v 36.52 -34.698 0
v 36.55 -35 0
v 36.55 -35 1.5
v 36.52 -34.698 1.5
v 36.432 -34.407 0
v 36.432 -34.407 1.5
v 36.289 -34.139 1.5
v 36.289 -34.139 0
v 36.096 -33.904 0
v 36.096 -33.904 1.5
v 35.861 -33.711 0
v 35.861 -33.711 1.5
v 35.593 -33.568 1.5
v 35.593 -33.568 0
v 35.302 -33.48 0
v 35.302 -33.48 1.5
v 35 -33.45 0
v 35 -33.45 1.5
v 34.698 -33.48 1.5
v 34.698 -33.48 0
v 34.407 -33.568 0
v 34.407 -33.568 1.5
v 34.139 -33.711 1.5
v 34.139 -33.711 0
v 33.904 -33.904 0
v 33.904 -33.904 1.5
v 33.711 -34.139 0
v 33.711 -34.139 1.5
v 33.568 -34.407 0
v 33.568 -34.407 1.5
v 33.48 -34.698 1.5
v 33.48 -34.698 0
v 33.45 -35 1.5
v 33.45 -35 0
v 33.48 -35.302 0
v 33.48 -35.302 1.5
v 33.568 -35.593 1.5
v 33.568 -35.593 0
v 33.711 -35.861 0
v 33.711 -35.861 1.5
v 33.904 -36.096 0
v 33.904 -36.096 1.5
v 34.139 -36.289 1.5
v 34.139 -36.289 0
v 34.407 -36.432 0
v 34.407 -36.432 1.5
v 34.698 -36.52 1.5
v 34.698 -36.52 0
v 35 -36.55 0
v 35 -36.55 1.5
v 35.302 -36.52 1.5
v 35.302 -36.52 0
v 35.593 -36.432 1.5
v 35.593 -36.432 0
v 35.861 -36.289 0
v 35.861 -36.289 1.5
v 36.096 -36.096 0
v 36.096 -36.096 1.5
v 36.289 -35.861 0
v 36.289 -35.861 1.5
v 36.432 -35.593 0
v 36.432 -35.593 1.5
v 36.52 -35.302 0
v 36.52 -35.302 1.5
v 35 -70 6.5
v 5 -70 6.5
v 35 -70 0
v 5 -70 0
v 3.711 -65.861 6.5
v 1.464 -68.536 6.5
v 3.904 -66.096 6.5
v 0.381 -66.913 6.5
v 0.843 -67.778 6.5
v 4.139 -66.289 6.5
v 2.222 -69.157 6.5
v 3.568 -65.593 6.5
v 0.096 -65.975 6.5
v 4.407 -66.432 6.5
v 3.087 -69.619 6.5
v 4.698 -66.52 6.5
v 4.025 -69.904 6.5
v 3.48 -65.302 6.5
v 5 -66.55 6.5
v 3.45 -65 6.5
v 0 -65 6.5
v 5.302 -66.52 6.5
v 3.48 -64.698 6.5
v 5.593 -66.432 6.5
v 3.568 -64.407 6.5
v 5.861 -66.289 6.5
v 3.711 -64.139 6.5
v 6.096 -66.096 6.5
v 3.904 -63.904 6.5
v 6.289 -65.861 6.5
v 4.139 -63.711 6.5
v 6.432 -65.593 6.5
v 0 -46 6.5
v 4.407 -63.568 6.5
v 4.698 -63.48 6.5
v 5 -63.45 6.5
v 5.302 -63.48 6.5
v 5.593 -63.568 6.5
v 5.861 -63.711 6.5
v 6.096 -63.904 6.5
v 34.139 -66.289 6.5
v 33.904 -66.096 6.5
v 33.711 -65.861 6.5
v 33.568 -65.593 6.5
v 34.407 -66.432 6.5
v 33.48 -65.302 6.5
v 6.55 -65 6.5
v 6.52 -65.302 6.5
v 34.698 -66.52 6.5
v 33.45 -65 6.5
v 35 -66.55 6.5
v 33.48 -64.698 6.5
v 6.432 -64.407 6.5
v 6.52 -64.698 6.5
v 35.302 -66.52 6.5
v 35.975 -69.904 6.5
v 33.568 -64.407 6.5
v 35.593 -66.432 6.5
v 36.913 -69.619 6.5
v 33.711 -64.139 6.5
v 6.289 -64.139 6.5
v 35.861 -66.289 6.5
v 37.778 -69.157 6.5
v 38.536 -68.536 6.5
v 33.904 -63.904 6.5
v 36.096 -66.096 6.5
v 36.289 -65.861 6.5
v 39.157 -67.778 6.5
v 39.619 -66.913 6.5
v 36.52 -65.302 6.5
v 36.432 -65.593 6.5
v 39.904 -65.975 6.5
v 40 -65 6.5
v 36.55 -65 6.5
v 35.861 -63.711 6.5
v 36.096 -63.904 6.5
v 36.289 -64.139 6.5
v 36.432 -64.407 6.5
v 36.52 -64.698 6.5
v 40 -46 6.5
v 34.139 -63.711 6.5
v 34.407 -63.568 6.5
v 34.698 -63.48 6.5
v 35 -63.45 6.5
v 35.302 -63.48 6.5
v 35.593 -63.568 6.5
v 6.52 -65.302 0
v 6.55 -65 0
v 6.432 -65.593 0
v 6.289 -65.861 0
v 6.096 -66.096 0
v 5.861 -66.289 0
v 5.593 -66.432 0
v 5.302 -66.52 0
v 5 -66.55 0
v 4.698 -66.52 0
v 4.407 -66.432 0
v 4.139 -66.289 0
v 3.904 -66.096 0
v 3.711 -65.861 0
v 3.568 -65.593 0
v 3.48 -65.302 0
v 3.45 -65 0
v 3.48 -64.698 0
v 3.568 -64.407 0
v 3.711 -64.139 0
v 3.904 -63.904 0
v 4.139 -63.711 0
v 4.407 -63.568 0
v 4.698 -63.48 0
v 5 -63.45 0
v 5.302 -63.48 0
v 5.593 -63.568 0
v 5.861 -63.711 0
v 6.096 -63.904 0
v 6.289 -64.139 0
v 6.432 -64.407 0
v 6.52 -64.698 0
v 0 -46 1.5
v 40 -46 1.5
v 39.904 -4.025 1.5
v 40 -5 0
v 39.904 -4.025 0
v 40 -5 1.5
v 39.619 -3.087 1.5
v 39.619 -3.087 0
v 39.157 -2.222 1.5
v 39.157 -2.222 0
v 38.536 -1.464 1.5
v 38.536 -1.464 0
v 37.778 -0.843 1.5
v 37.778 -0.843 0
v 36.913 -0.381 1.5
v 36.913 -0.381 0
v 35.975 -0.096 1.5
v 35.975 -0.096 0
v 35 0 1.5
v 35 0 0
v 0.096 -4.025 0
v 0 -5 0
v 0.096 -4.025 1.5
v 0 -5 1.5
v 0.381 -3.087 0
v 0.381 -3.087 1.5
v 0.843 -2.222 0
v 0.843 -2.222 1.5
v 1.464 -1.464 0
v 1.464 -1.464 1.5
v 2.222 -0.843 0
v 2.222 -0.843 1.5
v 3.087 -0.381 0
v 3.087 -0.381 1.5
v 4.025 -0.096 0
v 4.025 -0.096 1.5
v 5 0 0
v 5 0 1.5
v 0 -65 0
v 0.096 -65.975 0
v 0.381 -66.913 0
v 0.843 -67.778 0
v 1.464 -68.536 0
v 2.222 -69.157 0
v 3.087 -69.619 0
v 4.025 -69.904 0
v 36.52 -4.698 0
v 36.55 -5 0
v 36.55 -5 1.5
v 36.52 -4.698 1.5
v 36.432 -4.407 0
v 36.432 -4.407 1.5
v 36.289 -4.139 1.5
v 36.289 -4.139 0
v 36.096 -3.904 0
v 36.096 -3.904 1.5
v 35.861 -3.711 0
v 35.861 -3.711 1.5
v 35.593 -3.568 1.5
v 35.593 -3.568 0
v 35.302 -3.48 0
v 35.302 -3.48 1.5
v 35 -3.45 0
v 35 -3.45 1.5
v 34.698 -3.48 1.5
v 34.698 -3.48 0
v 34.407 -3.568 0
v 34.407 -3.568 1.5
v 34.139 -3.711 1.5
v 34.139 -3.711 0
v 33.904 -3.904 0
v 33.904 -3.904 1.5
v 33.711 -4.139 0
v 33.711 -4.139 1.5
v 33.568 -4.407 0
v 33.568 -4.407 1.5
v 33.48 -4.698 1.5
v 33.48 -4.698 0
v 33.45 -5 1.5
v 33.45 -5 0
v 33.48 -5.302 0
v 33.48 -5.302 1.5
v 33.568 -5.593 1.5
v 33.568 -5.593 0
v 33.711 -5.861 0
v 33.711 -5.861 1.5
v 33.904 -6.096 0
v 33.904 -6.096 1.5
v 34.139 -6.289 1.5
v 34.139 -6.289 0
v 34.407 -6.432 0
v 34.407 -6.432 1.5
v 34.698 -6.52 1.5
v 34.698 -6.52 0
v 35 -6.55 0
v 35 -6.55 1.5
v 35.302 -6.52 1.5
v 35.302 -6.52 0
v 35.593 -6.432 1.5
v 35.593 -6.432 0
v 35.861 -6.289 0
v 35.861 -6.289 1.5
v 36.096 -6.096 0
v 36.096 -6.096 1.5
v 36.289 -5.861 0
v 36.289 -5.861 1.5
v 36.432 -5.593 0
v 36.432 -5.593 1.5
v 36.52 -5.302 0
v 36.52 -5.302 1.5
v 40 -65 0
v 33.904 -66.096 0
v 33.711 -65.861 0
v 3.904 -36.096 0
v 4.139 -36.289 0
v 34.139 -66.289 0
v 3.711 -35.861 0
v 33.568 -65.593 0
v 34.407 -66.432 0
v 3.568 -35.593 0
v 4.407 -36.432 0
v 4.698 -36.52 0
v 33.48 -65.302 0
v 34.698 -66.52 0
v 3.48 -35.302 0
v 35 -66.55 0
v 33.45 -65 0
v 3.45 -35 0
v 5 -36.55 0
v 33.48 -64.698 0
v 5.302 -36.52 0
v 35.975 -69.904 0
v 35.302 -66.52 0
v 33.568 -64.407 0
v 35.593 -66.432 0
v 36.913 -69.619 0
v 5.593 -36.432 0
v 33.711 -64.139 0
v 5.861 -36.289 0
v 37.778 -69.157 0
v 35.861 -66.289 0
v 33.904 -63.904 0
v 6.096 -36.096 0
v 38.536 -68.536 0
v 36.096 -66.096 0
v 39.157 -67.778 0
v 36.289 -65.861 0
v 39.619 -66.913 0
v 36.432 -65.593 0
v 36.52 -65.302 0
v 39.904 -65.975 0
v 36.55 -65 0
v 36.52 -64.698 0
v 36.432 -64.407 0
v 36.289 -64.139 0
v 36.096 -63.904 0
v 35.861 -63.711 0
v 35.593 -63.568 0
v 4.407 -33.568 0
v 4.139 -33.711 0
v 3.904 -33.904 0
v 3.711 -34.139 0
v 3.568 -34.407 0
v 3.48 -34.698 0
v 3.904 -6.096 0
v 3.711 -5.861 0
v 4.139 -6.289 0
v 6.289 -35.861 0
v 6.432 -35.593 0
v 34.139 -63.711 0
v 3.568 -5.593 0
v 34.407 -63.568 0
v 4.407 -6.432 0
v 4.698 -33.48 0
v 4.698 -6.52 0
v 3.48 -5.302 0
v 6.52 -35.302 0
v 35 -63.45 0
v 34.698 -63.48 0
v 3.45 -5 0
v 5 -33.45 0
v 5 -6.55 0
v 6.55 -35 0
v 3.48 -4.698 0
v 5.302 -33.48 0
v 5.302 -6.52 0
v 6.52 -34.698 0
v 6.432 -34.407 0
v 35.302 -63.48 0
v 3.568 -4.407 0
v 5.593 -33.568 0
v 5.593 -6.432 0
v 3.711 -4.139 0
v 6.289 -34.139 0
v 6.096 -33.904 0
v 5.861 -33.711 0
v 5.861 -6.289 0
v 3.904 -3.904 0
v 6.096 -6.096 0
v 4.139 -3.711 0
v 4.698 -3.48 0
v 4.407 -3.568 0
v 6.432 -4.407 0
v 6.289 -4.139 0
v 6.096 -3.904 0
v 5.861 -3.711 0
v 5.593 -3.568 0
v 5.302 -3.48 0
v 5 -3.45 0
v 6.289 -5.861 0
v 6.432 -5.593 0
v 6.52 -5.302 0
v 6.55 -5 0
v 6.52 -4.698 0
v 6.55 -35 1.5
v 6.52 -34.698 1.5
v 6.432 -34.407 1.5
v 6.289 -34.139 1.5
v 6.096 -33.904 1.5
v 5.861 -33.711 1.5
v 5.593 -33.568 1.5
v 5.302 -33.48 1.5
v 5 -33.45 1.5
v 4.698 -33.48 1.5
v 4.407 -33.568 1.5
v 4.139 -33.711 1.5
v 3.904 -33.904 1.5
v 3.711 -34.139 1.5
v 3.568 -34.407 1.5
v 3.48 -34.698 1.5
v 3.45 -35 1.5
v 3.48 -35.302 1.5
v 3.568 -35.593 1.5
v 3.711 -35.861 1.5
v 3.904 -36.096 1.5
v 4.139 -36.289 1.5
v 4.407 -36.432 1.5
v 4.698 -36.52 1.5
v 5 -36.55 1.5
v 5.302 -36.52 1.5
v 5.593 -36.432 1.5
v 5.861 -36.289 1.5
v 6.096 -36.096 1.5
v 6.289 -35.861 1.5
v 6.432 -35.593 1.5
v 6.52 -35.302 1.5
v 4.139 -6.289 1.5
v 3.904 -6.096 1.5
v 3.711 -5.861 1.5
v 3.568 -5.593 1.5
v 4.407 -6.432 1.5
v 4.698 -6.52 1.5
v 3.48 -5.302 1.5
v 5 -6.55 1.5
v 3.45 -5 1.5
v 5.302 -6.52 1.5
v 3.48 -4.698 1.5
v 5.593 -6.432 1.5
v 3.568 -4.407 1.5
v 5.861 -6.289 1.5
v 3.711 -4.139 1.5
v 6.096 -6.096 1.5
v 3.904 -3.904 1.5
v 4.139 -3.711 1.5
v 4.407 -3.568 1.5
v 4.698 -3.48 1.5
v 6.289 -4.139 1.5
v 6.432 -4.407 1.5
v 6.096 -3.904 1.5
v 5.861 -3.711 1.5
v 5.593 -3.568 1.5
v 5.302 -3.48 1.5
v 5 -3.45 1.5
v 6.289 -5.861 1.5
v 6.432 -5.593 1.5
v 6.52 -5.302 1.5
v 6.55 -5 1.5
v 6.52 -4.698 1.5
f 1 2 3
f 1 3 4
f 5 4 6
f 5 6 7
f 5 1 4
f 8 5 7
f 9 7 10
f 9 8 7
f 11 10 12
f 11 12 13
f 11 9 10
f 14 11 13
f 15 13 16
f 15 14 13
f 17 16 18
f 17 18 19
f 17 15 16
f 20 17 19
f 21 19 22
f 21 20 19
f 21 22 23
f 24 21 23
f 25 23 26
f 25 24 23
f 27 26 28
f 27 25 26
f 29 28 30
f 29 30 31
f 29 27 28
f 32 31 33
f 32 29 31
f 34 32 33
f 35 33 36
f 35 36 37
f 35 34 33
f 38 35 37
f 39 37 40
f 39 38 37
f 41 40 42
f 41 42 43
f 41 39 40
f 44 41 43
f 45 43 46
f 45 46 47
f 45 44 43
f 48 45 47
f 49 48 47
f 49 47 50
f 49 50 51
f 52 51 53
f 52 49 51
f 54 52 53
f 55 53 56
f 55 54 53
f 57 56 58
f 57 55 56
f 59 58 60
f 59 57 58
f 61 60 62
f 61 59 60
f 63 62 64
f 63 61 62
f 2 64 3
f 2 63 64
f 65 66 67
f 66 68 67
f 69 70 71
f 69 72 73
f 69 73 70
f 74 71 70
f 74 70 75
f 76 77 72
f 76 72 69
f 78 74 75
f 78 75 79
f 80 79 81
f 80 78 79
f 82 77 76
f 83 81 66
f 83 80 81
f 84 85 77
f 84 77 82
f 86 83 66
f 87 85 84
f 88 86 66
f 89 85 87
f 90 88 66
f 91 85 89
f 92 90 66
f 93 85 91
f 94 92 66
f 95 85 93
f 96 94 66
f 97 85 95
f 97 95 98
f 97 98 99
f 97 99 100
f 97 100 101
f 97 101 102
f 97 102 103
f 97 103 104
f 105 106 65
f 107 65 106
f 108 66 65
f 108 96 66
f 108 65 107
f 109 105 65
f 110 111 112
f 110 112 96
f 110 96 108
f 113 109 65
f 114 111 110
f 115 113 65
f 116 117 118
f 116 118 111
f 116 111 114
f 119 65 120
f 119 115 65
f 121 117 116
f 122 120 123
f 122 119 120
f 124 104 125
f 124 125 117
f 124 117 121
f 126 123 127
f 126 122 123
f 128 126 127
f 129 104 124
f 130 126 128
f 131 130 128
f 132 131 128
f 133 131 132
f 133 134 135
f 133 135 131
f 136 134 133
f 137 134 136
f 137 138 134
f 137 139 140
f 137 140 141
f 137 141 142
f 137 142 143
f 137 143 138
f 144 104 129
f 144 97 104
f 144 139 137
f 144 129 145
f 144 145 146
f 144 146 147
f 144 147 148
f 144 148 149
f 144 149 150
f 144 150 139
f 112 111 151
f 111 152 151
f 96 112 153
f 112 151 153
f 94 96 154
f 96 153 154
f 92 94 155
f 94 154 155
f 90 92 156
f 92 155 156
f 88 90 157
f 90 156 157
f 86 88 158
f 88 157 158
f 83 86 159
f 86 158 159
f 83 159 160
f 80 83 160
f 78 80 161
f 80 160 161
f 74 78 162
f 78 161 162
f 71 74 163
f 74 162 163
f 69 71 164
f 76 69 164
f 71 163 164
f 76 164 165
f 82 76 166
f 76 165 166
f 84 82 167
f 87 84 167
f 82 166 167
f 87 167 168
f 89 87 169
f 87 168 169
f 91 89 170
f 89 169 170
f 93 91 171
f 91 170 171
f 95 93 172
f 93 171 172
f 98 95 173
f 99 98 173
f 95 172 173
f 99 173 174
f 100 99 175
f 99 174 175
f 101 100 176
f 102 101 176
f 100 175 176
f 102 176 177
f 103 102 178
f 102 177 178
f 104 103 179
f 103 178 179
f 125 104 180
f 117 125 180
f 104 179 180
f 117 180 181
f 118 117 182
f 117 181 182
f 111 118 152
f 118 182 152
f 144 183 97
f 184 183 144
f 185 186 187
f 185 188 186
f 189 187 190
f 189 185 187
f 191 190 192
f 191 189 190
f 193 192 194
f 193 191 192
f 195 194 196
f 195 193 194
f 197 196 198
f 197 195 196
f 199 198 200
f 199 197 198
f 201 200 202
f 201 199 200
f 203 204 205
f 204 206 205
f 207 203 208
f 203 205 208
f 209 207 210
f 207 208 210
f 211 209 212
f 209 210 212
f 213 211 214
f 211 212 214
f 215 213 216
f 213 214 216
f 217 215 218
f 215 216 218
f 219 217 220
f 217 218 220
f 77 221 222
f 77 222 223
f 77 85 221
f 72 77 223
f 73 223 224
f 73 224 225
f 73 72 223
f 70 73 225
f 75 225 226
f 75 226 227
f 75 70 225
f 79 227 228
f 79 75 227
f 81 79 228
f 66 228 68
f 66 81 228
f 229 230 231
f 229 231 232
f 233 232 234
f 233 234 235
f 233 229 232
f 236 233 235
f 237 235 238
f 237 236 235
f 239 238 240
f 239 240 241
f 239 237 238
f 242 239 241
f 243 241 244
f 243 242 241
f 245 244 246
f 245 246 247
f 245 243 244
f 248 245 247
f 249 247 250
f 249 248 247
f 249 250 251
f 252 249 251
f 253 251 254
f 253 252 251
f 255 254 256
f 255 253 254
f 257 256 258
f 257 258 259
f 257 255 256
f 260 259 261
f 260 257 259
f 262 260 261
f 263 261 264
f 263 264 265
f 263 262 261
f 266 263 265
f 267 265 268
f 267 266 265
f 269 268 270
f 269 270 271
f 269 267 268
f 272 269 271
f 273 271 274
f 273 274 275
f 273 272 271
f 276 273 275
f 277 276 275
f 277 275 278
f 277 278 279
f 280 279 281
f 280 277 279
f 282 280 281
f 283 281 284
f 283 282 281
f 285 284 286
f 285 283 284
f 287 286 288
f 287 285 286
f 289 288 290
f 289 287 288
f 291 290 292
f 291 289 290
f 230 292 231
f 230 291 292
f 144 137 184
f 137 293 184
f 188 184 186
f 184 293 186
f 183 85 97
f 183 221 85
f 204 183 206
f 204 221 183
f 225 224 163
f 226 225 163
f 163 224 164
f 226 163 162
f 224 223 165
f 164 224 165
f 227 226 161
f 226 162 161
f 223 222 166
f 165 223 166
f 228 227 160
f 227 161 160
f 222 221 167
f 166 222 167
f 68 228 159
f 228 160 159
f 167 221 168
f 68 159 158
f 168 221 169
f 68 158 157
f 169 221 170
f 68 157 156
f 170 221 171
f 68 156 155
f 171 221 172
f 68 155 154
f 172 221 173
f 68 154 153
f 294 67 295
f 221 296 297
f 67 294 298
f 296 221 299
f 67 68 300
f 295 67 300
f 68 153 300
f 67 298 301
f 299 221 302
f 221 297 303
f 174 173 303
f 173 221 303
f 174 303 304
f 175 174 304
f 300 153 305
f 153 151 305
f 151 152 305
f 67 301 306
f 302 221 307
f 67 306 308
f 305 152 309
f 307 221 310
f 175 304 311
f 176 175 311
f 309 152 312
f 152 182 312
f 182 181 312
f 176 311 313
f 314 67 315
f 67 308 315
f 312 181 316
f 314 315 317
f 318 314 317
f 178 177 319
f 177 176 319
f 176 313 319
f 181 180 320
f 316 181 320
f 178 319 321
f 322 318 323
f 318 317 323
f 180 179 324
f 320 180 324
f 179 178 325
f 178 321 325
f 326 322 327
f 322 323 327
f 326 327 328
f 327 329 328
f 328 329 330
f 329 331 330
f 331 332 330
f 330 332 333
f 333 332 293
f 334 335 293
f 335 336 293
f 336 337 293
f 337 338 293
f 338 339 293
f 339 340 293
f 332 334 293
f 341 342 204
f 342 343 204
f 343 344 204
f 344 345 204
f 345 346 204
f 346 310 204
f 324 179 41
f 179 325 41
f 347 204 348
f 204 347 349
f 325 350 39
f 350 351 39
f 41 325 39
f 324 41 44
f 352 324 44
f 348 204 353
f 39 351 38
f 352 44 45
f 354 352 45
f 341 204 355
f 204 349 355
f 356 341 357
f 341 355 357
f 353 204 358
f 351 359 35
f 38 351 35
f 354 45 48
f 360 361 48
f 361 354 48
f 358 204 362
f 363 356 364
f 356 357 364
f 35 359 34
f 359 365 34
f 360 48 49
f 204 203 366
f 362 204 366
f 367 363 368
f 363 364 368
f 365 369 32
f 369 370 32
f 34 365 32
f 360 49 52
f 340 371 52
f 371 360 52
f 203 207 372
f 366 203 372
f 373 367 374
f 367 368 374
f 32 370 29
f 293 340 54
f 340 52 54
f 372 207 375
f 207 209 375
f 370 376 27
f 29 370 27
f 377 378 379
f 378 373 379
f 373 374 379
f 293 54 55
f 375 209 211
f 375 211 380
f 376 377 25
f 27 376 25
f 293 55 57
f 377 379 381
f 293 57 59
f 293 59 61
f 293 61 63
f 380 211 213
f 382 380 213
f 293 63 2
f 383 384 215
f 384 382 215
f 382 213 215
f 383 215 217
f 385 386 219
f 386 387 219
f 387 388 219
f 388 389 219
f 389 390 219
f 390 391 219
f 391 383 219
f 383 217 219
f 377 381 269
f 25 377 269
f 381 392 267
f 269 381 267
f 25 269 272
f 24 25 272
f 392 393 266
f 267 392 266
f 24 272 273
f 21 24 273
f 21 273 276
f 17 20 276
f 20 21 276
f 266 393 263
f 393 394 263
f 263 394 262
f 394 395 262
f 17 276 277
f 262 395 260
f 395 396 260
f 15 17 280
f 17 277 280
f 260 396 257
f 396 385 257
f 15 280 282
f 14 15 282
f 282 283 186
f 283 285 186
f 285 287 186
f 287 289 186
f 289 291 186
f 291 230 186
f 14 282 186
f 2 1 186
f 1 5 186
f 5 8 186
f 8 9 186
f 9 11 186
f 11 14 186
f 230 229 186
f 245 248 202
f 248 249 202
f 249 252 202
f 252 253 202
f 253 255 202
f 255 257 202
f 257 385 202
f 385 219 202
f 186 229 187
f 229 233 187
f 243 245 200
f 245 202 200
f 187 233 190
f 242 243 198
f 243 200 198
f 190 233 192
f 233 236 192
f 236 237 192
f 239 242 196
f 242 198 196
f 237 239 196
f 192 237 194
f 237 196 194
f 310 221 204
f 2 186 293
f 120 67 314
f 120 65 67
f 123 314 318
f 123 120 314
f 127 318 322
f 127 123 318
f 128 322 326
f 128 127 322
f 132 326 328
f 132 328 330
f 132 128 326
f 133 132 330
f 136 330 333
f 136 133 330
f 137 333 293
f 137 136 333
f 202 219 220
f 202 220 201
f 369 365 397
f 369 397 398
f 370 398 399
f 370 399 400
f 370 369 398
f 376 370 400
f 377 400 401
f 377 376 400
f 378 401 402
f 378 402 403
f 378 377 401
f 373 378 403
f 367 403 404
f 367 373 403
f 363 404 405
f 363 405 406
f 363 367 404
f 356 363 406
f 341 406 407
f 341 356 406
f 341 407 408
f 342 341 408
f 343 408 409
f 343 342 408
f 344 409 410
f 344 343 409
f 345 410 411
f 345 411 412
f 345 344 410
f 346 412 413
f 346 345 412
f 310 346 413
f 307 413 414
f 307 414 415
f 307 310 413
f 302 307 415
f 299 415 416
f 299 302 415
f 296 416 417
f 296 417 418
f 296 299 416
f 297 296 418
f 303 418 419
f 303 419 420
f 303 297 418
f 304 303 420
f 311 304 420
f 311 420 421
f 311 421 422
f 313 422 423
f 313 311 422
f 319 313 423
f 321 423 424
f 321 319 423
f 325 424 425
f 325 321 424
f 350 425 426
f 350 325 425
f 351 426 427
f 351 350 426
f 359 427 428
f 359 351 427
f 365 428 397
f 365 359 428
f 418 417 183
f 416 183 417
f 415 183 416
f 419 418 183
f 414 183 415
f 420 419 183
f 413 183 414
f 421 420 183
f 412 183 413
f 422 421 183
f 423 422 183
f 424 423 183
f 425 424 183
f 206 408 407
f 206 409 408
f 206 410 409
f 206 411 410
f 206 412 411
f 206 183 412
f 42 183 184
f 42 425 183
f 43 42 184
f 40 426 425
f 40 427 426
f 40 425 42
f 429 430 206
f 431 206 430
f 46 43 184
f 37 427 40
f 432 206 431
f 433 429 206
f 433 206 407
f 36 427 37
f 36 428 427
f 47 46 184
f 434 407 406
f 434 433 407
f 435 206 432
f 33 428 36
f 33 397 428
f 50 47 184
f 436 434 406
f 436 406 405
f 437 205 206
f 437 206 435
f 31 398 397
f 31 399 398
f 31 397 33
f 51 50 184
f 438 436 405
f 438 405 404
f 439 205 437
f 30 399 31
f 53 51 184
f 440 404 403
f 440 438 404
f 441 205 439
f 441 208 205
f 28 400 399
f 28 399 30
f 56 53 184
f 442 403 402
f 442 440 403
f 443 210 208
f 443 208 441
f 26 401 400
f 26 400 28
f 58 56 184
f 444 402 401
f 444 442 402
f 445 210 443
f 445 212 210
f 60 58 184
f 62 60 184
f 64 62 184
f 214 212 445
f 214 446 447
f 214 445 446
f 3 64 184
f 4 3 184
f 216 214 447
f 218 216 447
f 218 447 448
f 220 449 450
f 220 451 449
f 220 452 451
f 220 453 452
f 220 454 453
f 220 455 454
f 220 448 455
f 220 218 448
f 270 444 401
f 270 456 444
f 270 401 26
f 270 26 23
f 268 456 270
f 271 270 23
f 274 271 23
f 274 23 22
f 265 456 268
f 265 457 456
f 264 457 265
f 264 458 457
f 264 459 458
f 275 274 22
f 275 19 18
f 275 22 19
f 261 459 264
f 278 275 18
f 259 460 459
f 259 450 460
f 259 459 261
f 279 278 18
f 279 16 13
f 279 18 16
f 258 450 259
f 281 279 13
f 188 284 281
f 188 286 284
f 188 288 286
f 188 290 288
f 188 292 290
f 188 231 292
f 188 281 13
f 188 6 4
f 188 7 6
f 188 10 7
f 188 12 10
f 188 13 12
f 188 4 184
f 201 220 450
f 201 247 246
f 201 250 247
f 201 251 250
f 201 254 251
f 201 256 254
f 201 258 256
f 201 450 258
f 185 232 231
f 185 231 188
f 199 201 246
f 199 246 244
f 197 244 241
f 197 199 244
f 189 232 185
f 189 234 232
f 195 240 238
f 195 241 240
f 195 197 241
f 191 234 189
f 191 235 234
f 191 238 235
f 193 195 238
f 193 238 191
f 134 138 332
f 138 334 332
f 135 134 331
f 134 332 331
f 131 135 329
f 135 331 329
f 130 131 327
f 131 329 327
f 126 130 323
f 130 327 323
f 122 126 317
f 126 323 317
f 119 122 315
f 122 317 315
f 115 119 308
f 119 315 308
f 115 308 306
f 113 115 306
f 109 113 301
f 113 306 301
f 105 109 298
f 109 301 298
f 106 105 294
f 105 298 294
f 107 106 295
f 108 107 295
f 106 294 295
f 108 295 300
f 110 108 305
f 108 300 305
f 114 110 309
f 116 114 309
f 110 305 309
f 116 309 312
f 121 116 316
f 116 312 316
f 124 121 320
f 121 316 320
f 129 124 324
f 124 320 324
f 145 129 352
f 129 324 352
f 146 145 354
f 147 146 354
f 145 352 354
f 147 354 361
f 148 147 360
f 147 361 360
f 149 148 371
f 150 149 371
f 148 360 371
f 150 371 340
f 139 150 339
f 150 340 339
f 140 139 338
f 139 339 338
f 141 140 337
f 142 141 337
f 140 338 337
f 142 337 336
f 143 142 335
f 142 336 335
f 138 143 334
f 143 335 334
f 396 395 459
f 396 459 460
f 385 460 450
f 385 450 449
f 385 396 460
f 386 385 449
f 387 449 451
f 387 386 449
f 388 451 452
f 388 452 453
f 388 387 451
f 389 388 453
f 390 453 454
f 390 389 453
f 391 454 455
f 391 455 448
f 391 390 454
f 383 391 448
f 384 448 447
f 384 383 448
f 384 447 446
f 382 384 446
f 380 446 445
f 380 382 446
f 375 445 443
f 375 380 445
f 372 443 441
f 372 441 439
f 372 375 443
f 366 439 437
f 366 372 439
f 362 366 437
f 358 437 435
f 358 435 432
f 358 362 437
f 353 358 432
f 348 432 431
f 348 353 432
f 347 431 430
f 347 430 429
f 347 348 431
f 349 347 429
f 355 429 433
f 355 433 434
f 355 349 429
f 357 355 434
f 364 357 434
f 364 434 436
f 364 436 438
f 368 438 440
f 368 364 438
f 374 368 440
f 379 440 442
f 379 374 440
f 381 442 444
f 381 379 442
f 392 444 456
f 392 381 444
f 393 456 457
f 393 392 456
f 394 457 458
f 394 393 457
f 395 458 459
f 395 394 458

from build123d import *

# Parameters (mm, degrees)
SKETCH_1_W          = 40
SKETCH_1_H          = 70
SKETCH_1_R          = 1.55
EXTRUDE_1_DEPTH     = 1.5
SKETCH_2_W          = 40
SKETCH_2_H          = 24
EXTRUDE_2_DEPTH     = 5
SKETCH_3_R          = 1.55
CUT_EXTRUDE_1_DEPTH = 25
FILLET_1_R          = 5


with BuildPart() as part:
    # 草图1 → 凸台-拉伸1 (new body)
    with BuildSketch(Plane.XY):
        with Locations((20, -35)):
            Rectangle(SKETCH_1_W, SKETCH_1_H)
        with Locations((5, -5)):
            Circle(SKETCH_1_R, mode=Mode.SUBTRACT)
        with Locations((35, -5)):
            Circle(SKETCH_1_R, mode=Mode.SUBTRACT)
        with Locations((5, -35)):
            Circle(SKETCH_1_R, mode=Mode.SUBTRACT)
        with Locations((35, -35)):
            Circle(SKETCH_1_R, mode=Mode.SUBTRACT)
        with Locations((5, -65)):
            Circle(SKETCH_1_R, mode=Mode.SUBTRACT)
        with Locations((35, -65)):
            Circle(SKETCH_1_R, mode=Mode.SUBTRACT)
    extrude(amount=EXTRUDE_1_DEPTH)

    # 草图2 → 凸台-拉伸2 (add)
    with BuildSketch(Plane.XY.offset(1.5)):
        with Locations((20, -58)):
            Rectangle(SKETCH_2_W, SKETCH_2_H)
    extrude(amount=EXTRUDE_2_DEPTH)

    # 草图3 → 切除-拉伸1 (cut)
    with BuildSketch(Plane(origin=(0, 0, 1.5), x_dir=(-1, 0, 0), z_dir=(0, 0, -1))):
        with Locations(Location((-35, -65, 0), (0, 0, 180))):
            Circle(SKETCH_3_R)
        with Locations(Location((-5, -65, 0), (0, 0, 180))):
            Circle(SKETCH_3_R)
    extrude(amount=-CUT_EXTRUDE_1_DEPTH, mode=Mode.SUBTRACT)

    # 圆角1
    fillet_1_edges = [part.edges().sort_by_distance(p)[0] for p in [
        (0, 0, 0.75),
        (40, 0, 0.75),
        (40, -70, 3.25),
        (0, -70, 3.25),
    ]]
    fillet(fillet_1_edges, radius=FILLET_1_R)


solid = part.part
